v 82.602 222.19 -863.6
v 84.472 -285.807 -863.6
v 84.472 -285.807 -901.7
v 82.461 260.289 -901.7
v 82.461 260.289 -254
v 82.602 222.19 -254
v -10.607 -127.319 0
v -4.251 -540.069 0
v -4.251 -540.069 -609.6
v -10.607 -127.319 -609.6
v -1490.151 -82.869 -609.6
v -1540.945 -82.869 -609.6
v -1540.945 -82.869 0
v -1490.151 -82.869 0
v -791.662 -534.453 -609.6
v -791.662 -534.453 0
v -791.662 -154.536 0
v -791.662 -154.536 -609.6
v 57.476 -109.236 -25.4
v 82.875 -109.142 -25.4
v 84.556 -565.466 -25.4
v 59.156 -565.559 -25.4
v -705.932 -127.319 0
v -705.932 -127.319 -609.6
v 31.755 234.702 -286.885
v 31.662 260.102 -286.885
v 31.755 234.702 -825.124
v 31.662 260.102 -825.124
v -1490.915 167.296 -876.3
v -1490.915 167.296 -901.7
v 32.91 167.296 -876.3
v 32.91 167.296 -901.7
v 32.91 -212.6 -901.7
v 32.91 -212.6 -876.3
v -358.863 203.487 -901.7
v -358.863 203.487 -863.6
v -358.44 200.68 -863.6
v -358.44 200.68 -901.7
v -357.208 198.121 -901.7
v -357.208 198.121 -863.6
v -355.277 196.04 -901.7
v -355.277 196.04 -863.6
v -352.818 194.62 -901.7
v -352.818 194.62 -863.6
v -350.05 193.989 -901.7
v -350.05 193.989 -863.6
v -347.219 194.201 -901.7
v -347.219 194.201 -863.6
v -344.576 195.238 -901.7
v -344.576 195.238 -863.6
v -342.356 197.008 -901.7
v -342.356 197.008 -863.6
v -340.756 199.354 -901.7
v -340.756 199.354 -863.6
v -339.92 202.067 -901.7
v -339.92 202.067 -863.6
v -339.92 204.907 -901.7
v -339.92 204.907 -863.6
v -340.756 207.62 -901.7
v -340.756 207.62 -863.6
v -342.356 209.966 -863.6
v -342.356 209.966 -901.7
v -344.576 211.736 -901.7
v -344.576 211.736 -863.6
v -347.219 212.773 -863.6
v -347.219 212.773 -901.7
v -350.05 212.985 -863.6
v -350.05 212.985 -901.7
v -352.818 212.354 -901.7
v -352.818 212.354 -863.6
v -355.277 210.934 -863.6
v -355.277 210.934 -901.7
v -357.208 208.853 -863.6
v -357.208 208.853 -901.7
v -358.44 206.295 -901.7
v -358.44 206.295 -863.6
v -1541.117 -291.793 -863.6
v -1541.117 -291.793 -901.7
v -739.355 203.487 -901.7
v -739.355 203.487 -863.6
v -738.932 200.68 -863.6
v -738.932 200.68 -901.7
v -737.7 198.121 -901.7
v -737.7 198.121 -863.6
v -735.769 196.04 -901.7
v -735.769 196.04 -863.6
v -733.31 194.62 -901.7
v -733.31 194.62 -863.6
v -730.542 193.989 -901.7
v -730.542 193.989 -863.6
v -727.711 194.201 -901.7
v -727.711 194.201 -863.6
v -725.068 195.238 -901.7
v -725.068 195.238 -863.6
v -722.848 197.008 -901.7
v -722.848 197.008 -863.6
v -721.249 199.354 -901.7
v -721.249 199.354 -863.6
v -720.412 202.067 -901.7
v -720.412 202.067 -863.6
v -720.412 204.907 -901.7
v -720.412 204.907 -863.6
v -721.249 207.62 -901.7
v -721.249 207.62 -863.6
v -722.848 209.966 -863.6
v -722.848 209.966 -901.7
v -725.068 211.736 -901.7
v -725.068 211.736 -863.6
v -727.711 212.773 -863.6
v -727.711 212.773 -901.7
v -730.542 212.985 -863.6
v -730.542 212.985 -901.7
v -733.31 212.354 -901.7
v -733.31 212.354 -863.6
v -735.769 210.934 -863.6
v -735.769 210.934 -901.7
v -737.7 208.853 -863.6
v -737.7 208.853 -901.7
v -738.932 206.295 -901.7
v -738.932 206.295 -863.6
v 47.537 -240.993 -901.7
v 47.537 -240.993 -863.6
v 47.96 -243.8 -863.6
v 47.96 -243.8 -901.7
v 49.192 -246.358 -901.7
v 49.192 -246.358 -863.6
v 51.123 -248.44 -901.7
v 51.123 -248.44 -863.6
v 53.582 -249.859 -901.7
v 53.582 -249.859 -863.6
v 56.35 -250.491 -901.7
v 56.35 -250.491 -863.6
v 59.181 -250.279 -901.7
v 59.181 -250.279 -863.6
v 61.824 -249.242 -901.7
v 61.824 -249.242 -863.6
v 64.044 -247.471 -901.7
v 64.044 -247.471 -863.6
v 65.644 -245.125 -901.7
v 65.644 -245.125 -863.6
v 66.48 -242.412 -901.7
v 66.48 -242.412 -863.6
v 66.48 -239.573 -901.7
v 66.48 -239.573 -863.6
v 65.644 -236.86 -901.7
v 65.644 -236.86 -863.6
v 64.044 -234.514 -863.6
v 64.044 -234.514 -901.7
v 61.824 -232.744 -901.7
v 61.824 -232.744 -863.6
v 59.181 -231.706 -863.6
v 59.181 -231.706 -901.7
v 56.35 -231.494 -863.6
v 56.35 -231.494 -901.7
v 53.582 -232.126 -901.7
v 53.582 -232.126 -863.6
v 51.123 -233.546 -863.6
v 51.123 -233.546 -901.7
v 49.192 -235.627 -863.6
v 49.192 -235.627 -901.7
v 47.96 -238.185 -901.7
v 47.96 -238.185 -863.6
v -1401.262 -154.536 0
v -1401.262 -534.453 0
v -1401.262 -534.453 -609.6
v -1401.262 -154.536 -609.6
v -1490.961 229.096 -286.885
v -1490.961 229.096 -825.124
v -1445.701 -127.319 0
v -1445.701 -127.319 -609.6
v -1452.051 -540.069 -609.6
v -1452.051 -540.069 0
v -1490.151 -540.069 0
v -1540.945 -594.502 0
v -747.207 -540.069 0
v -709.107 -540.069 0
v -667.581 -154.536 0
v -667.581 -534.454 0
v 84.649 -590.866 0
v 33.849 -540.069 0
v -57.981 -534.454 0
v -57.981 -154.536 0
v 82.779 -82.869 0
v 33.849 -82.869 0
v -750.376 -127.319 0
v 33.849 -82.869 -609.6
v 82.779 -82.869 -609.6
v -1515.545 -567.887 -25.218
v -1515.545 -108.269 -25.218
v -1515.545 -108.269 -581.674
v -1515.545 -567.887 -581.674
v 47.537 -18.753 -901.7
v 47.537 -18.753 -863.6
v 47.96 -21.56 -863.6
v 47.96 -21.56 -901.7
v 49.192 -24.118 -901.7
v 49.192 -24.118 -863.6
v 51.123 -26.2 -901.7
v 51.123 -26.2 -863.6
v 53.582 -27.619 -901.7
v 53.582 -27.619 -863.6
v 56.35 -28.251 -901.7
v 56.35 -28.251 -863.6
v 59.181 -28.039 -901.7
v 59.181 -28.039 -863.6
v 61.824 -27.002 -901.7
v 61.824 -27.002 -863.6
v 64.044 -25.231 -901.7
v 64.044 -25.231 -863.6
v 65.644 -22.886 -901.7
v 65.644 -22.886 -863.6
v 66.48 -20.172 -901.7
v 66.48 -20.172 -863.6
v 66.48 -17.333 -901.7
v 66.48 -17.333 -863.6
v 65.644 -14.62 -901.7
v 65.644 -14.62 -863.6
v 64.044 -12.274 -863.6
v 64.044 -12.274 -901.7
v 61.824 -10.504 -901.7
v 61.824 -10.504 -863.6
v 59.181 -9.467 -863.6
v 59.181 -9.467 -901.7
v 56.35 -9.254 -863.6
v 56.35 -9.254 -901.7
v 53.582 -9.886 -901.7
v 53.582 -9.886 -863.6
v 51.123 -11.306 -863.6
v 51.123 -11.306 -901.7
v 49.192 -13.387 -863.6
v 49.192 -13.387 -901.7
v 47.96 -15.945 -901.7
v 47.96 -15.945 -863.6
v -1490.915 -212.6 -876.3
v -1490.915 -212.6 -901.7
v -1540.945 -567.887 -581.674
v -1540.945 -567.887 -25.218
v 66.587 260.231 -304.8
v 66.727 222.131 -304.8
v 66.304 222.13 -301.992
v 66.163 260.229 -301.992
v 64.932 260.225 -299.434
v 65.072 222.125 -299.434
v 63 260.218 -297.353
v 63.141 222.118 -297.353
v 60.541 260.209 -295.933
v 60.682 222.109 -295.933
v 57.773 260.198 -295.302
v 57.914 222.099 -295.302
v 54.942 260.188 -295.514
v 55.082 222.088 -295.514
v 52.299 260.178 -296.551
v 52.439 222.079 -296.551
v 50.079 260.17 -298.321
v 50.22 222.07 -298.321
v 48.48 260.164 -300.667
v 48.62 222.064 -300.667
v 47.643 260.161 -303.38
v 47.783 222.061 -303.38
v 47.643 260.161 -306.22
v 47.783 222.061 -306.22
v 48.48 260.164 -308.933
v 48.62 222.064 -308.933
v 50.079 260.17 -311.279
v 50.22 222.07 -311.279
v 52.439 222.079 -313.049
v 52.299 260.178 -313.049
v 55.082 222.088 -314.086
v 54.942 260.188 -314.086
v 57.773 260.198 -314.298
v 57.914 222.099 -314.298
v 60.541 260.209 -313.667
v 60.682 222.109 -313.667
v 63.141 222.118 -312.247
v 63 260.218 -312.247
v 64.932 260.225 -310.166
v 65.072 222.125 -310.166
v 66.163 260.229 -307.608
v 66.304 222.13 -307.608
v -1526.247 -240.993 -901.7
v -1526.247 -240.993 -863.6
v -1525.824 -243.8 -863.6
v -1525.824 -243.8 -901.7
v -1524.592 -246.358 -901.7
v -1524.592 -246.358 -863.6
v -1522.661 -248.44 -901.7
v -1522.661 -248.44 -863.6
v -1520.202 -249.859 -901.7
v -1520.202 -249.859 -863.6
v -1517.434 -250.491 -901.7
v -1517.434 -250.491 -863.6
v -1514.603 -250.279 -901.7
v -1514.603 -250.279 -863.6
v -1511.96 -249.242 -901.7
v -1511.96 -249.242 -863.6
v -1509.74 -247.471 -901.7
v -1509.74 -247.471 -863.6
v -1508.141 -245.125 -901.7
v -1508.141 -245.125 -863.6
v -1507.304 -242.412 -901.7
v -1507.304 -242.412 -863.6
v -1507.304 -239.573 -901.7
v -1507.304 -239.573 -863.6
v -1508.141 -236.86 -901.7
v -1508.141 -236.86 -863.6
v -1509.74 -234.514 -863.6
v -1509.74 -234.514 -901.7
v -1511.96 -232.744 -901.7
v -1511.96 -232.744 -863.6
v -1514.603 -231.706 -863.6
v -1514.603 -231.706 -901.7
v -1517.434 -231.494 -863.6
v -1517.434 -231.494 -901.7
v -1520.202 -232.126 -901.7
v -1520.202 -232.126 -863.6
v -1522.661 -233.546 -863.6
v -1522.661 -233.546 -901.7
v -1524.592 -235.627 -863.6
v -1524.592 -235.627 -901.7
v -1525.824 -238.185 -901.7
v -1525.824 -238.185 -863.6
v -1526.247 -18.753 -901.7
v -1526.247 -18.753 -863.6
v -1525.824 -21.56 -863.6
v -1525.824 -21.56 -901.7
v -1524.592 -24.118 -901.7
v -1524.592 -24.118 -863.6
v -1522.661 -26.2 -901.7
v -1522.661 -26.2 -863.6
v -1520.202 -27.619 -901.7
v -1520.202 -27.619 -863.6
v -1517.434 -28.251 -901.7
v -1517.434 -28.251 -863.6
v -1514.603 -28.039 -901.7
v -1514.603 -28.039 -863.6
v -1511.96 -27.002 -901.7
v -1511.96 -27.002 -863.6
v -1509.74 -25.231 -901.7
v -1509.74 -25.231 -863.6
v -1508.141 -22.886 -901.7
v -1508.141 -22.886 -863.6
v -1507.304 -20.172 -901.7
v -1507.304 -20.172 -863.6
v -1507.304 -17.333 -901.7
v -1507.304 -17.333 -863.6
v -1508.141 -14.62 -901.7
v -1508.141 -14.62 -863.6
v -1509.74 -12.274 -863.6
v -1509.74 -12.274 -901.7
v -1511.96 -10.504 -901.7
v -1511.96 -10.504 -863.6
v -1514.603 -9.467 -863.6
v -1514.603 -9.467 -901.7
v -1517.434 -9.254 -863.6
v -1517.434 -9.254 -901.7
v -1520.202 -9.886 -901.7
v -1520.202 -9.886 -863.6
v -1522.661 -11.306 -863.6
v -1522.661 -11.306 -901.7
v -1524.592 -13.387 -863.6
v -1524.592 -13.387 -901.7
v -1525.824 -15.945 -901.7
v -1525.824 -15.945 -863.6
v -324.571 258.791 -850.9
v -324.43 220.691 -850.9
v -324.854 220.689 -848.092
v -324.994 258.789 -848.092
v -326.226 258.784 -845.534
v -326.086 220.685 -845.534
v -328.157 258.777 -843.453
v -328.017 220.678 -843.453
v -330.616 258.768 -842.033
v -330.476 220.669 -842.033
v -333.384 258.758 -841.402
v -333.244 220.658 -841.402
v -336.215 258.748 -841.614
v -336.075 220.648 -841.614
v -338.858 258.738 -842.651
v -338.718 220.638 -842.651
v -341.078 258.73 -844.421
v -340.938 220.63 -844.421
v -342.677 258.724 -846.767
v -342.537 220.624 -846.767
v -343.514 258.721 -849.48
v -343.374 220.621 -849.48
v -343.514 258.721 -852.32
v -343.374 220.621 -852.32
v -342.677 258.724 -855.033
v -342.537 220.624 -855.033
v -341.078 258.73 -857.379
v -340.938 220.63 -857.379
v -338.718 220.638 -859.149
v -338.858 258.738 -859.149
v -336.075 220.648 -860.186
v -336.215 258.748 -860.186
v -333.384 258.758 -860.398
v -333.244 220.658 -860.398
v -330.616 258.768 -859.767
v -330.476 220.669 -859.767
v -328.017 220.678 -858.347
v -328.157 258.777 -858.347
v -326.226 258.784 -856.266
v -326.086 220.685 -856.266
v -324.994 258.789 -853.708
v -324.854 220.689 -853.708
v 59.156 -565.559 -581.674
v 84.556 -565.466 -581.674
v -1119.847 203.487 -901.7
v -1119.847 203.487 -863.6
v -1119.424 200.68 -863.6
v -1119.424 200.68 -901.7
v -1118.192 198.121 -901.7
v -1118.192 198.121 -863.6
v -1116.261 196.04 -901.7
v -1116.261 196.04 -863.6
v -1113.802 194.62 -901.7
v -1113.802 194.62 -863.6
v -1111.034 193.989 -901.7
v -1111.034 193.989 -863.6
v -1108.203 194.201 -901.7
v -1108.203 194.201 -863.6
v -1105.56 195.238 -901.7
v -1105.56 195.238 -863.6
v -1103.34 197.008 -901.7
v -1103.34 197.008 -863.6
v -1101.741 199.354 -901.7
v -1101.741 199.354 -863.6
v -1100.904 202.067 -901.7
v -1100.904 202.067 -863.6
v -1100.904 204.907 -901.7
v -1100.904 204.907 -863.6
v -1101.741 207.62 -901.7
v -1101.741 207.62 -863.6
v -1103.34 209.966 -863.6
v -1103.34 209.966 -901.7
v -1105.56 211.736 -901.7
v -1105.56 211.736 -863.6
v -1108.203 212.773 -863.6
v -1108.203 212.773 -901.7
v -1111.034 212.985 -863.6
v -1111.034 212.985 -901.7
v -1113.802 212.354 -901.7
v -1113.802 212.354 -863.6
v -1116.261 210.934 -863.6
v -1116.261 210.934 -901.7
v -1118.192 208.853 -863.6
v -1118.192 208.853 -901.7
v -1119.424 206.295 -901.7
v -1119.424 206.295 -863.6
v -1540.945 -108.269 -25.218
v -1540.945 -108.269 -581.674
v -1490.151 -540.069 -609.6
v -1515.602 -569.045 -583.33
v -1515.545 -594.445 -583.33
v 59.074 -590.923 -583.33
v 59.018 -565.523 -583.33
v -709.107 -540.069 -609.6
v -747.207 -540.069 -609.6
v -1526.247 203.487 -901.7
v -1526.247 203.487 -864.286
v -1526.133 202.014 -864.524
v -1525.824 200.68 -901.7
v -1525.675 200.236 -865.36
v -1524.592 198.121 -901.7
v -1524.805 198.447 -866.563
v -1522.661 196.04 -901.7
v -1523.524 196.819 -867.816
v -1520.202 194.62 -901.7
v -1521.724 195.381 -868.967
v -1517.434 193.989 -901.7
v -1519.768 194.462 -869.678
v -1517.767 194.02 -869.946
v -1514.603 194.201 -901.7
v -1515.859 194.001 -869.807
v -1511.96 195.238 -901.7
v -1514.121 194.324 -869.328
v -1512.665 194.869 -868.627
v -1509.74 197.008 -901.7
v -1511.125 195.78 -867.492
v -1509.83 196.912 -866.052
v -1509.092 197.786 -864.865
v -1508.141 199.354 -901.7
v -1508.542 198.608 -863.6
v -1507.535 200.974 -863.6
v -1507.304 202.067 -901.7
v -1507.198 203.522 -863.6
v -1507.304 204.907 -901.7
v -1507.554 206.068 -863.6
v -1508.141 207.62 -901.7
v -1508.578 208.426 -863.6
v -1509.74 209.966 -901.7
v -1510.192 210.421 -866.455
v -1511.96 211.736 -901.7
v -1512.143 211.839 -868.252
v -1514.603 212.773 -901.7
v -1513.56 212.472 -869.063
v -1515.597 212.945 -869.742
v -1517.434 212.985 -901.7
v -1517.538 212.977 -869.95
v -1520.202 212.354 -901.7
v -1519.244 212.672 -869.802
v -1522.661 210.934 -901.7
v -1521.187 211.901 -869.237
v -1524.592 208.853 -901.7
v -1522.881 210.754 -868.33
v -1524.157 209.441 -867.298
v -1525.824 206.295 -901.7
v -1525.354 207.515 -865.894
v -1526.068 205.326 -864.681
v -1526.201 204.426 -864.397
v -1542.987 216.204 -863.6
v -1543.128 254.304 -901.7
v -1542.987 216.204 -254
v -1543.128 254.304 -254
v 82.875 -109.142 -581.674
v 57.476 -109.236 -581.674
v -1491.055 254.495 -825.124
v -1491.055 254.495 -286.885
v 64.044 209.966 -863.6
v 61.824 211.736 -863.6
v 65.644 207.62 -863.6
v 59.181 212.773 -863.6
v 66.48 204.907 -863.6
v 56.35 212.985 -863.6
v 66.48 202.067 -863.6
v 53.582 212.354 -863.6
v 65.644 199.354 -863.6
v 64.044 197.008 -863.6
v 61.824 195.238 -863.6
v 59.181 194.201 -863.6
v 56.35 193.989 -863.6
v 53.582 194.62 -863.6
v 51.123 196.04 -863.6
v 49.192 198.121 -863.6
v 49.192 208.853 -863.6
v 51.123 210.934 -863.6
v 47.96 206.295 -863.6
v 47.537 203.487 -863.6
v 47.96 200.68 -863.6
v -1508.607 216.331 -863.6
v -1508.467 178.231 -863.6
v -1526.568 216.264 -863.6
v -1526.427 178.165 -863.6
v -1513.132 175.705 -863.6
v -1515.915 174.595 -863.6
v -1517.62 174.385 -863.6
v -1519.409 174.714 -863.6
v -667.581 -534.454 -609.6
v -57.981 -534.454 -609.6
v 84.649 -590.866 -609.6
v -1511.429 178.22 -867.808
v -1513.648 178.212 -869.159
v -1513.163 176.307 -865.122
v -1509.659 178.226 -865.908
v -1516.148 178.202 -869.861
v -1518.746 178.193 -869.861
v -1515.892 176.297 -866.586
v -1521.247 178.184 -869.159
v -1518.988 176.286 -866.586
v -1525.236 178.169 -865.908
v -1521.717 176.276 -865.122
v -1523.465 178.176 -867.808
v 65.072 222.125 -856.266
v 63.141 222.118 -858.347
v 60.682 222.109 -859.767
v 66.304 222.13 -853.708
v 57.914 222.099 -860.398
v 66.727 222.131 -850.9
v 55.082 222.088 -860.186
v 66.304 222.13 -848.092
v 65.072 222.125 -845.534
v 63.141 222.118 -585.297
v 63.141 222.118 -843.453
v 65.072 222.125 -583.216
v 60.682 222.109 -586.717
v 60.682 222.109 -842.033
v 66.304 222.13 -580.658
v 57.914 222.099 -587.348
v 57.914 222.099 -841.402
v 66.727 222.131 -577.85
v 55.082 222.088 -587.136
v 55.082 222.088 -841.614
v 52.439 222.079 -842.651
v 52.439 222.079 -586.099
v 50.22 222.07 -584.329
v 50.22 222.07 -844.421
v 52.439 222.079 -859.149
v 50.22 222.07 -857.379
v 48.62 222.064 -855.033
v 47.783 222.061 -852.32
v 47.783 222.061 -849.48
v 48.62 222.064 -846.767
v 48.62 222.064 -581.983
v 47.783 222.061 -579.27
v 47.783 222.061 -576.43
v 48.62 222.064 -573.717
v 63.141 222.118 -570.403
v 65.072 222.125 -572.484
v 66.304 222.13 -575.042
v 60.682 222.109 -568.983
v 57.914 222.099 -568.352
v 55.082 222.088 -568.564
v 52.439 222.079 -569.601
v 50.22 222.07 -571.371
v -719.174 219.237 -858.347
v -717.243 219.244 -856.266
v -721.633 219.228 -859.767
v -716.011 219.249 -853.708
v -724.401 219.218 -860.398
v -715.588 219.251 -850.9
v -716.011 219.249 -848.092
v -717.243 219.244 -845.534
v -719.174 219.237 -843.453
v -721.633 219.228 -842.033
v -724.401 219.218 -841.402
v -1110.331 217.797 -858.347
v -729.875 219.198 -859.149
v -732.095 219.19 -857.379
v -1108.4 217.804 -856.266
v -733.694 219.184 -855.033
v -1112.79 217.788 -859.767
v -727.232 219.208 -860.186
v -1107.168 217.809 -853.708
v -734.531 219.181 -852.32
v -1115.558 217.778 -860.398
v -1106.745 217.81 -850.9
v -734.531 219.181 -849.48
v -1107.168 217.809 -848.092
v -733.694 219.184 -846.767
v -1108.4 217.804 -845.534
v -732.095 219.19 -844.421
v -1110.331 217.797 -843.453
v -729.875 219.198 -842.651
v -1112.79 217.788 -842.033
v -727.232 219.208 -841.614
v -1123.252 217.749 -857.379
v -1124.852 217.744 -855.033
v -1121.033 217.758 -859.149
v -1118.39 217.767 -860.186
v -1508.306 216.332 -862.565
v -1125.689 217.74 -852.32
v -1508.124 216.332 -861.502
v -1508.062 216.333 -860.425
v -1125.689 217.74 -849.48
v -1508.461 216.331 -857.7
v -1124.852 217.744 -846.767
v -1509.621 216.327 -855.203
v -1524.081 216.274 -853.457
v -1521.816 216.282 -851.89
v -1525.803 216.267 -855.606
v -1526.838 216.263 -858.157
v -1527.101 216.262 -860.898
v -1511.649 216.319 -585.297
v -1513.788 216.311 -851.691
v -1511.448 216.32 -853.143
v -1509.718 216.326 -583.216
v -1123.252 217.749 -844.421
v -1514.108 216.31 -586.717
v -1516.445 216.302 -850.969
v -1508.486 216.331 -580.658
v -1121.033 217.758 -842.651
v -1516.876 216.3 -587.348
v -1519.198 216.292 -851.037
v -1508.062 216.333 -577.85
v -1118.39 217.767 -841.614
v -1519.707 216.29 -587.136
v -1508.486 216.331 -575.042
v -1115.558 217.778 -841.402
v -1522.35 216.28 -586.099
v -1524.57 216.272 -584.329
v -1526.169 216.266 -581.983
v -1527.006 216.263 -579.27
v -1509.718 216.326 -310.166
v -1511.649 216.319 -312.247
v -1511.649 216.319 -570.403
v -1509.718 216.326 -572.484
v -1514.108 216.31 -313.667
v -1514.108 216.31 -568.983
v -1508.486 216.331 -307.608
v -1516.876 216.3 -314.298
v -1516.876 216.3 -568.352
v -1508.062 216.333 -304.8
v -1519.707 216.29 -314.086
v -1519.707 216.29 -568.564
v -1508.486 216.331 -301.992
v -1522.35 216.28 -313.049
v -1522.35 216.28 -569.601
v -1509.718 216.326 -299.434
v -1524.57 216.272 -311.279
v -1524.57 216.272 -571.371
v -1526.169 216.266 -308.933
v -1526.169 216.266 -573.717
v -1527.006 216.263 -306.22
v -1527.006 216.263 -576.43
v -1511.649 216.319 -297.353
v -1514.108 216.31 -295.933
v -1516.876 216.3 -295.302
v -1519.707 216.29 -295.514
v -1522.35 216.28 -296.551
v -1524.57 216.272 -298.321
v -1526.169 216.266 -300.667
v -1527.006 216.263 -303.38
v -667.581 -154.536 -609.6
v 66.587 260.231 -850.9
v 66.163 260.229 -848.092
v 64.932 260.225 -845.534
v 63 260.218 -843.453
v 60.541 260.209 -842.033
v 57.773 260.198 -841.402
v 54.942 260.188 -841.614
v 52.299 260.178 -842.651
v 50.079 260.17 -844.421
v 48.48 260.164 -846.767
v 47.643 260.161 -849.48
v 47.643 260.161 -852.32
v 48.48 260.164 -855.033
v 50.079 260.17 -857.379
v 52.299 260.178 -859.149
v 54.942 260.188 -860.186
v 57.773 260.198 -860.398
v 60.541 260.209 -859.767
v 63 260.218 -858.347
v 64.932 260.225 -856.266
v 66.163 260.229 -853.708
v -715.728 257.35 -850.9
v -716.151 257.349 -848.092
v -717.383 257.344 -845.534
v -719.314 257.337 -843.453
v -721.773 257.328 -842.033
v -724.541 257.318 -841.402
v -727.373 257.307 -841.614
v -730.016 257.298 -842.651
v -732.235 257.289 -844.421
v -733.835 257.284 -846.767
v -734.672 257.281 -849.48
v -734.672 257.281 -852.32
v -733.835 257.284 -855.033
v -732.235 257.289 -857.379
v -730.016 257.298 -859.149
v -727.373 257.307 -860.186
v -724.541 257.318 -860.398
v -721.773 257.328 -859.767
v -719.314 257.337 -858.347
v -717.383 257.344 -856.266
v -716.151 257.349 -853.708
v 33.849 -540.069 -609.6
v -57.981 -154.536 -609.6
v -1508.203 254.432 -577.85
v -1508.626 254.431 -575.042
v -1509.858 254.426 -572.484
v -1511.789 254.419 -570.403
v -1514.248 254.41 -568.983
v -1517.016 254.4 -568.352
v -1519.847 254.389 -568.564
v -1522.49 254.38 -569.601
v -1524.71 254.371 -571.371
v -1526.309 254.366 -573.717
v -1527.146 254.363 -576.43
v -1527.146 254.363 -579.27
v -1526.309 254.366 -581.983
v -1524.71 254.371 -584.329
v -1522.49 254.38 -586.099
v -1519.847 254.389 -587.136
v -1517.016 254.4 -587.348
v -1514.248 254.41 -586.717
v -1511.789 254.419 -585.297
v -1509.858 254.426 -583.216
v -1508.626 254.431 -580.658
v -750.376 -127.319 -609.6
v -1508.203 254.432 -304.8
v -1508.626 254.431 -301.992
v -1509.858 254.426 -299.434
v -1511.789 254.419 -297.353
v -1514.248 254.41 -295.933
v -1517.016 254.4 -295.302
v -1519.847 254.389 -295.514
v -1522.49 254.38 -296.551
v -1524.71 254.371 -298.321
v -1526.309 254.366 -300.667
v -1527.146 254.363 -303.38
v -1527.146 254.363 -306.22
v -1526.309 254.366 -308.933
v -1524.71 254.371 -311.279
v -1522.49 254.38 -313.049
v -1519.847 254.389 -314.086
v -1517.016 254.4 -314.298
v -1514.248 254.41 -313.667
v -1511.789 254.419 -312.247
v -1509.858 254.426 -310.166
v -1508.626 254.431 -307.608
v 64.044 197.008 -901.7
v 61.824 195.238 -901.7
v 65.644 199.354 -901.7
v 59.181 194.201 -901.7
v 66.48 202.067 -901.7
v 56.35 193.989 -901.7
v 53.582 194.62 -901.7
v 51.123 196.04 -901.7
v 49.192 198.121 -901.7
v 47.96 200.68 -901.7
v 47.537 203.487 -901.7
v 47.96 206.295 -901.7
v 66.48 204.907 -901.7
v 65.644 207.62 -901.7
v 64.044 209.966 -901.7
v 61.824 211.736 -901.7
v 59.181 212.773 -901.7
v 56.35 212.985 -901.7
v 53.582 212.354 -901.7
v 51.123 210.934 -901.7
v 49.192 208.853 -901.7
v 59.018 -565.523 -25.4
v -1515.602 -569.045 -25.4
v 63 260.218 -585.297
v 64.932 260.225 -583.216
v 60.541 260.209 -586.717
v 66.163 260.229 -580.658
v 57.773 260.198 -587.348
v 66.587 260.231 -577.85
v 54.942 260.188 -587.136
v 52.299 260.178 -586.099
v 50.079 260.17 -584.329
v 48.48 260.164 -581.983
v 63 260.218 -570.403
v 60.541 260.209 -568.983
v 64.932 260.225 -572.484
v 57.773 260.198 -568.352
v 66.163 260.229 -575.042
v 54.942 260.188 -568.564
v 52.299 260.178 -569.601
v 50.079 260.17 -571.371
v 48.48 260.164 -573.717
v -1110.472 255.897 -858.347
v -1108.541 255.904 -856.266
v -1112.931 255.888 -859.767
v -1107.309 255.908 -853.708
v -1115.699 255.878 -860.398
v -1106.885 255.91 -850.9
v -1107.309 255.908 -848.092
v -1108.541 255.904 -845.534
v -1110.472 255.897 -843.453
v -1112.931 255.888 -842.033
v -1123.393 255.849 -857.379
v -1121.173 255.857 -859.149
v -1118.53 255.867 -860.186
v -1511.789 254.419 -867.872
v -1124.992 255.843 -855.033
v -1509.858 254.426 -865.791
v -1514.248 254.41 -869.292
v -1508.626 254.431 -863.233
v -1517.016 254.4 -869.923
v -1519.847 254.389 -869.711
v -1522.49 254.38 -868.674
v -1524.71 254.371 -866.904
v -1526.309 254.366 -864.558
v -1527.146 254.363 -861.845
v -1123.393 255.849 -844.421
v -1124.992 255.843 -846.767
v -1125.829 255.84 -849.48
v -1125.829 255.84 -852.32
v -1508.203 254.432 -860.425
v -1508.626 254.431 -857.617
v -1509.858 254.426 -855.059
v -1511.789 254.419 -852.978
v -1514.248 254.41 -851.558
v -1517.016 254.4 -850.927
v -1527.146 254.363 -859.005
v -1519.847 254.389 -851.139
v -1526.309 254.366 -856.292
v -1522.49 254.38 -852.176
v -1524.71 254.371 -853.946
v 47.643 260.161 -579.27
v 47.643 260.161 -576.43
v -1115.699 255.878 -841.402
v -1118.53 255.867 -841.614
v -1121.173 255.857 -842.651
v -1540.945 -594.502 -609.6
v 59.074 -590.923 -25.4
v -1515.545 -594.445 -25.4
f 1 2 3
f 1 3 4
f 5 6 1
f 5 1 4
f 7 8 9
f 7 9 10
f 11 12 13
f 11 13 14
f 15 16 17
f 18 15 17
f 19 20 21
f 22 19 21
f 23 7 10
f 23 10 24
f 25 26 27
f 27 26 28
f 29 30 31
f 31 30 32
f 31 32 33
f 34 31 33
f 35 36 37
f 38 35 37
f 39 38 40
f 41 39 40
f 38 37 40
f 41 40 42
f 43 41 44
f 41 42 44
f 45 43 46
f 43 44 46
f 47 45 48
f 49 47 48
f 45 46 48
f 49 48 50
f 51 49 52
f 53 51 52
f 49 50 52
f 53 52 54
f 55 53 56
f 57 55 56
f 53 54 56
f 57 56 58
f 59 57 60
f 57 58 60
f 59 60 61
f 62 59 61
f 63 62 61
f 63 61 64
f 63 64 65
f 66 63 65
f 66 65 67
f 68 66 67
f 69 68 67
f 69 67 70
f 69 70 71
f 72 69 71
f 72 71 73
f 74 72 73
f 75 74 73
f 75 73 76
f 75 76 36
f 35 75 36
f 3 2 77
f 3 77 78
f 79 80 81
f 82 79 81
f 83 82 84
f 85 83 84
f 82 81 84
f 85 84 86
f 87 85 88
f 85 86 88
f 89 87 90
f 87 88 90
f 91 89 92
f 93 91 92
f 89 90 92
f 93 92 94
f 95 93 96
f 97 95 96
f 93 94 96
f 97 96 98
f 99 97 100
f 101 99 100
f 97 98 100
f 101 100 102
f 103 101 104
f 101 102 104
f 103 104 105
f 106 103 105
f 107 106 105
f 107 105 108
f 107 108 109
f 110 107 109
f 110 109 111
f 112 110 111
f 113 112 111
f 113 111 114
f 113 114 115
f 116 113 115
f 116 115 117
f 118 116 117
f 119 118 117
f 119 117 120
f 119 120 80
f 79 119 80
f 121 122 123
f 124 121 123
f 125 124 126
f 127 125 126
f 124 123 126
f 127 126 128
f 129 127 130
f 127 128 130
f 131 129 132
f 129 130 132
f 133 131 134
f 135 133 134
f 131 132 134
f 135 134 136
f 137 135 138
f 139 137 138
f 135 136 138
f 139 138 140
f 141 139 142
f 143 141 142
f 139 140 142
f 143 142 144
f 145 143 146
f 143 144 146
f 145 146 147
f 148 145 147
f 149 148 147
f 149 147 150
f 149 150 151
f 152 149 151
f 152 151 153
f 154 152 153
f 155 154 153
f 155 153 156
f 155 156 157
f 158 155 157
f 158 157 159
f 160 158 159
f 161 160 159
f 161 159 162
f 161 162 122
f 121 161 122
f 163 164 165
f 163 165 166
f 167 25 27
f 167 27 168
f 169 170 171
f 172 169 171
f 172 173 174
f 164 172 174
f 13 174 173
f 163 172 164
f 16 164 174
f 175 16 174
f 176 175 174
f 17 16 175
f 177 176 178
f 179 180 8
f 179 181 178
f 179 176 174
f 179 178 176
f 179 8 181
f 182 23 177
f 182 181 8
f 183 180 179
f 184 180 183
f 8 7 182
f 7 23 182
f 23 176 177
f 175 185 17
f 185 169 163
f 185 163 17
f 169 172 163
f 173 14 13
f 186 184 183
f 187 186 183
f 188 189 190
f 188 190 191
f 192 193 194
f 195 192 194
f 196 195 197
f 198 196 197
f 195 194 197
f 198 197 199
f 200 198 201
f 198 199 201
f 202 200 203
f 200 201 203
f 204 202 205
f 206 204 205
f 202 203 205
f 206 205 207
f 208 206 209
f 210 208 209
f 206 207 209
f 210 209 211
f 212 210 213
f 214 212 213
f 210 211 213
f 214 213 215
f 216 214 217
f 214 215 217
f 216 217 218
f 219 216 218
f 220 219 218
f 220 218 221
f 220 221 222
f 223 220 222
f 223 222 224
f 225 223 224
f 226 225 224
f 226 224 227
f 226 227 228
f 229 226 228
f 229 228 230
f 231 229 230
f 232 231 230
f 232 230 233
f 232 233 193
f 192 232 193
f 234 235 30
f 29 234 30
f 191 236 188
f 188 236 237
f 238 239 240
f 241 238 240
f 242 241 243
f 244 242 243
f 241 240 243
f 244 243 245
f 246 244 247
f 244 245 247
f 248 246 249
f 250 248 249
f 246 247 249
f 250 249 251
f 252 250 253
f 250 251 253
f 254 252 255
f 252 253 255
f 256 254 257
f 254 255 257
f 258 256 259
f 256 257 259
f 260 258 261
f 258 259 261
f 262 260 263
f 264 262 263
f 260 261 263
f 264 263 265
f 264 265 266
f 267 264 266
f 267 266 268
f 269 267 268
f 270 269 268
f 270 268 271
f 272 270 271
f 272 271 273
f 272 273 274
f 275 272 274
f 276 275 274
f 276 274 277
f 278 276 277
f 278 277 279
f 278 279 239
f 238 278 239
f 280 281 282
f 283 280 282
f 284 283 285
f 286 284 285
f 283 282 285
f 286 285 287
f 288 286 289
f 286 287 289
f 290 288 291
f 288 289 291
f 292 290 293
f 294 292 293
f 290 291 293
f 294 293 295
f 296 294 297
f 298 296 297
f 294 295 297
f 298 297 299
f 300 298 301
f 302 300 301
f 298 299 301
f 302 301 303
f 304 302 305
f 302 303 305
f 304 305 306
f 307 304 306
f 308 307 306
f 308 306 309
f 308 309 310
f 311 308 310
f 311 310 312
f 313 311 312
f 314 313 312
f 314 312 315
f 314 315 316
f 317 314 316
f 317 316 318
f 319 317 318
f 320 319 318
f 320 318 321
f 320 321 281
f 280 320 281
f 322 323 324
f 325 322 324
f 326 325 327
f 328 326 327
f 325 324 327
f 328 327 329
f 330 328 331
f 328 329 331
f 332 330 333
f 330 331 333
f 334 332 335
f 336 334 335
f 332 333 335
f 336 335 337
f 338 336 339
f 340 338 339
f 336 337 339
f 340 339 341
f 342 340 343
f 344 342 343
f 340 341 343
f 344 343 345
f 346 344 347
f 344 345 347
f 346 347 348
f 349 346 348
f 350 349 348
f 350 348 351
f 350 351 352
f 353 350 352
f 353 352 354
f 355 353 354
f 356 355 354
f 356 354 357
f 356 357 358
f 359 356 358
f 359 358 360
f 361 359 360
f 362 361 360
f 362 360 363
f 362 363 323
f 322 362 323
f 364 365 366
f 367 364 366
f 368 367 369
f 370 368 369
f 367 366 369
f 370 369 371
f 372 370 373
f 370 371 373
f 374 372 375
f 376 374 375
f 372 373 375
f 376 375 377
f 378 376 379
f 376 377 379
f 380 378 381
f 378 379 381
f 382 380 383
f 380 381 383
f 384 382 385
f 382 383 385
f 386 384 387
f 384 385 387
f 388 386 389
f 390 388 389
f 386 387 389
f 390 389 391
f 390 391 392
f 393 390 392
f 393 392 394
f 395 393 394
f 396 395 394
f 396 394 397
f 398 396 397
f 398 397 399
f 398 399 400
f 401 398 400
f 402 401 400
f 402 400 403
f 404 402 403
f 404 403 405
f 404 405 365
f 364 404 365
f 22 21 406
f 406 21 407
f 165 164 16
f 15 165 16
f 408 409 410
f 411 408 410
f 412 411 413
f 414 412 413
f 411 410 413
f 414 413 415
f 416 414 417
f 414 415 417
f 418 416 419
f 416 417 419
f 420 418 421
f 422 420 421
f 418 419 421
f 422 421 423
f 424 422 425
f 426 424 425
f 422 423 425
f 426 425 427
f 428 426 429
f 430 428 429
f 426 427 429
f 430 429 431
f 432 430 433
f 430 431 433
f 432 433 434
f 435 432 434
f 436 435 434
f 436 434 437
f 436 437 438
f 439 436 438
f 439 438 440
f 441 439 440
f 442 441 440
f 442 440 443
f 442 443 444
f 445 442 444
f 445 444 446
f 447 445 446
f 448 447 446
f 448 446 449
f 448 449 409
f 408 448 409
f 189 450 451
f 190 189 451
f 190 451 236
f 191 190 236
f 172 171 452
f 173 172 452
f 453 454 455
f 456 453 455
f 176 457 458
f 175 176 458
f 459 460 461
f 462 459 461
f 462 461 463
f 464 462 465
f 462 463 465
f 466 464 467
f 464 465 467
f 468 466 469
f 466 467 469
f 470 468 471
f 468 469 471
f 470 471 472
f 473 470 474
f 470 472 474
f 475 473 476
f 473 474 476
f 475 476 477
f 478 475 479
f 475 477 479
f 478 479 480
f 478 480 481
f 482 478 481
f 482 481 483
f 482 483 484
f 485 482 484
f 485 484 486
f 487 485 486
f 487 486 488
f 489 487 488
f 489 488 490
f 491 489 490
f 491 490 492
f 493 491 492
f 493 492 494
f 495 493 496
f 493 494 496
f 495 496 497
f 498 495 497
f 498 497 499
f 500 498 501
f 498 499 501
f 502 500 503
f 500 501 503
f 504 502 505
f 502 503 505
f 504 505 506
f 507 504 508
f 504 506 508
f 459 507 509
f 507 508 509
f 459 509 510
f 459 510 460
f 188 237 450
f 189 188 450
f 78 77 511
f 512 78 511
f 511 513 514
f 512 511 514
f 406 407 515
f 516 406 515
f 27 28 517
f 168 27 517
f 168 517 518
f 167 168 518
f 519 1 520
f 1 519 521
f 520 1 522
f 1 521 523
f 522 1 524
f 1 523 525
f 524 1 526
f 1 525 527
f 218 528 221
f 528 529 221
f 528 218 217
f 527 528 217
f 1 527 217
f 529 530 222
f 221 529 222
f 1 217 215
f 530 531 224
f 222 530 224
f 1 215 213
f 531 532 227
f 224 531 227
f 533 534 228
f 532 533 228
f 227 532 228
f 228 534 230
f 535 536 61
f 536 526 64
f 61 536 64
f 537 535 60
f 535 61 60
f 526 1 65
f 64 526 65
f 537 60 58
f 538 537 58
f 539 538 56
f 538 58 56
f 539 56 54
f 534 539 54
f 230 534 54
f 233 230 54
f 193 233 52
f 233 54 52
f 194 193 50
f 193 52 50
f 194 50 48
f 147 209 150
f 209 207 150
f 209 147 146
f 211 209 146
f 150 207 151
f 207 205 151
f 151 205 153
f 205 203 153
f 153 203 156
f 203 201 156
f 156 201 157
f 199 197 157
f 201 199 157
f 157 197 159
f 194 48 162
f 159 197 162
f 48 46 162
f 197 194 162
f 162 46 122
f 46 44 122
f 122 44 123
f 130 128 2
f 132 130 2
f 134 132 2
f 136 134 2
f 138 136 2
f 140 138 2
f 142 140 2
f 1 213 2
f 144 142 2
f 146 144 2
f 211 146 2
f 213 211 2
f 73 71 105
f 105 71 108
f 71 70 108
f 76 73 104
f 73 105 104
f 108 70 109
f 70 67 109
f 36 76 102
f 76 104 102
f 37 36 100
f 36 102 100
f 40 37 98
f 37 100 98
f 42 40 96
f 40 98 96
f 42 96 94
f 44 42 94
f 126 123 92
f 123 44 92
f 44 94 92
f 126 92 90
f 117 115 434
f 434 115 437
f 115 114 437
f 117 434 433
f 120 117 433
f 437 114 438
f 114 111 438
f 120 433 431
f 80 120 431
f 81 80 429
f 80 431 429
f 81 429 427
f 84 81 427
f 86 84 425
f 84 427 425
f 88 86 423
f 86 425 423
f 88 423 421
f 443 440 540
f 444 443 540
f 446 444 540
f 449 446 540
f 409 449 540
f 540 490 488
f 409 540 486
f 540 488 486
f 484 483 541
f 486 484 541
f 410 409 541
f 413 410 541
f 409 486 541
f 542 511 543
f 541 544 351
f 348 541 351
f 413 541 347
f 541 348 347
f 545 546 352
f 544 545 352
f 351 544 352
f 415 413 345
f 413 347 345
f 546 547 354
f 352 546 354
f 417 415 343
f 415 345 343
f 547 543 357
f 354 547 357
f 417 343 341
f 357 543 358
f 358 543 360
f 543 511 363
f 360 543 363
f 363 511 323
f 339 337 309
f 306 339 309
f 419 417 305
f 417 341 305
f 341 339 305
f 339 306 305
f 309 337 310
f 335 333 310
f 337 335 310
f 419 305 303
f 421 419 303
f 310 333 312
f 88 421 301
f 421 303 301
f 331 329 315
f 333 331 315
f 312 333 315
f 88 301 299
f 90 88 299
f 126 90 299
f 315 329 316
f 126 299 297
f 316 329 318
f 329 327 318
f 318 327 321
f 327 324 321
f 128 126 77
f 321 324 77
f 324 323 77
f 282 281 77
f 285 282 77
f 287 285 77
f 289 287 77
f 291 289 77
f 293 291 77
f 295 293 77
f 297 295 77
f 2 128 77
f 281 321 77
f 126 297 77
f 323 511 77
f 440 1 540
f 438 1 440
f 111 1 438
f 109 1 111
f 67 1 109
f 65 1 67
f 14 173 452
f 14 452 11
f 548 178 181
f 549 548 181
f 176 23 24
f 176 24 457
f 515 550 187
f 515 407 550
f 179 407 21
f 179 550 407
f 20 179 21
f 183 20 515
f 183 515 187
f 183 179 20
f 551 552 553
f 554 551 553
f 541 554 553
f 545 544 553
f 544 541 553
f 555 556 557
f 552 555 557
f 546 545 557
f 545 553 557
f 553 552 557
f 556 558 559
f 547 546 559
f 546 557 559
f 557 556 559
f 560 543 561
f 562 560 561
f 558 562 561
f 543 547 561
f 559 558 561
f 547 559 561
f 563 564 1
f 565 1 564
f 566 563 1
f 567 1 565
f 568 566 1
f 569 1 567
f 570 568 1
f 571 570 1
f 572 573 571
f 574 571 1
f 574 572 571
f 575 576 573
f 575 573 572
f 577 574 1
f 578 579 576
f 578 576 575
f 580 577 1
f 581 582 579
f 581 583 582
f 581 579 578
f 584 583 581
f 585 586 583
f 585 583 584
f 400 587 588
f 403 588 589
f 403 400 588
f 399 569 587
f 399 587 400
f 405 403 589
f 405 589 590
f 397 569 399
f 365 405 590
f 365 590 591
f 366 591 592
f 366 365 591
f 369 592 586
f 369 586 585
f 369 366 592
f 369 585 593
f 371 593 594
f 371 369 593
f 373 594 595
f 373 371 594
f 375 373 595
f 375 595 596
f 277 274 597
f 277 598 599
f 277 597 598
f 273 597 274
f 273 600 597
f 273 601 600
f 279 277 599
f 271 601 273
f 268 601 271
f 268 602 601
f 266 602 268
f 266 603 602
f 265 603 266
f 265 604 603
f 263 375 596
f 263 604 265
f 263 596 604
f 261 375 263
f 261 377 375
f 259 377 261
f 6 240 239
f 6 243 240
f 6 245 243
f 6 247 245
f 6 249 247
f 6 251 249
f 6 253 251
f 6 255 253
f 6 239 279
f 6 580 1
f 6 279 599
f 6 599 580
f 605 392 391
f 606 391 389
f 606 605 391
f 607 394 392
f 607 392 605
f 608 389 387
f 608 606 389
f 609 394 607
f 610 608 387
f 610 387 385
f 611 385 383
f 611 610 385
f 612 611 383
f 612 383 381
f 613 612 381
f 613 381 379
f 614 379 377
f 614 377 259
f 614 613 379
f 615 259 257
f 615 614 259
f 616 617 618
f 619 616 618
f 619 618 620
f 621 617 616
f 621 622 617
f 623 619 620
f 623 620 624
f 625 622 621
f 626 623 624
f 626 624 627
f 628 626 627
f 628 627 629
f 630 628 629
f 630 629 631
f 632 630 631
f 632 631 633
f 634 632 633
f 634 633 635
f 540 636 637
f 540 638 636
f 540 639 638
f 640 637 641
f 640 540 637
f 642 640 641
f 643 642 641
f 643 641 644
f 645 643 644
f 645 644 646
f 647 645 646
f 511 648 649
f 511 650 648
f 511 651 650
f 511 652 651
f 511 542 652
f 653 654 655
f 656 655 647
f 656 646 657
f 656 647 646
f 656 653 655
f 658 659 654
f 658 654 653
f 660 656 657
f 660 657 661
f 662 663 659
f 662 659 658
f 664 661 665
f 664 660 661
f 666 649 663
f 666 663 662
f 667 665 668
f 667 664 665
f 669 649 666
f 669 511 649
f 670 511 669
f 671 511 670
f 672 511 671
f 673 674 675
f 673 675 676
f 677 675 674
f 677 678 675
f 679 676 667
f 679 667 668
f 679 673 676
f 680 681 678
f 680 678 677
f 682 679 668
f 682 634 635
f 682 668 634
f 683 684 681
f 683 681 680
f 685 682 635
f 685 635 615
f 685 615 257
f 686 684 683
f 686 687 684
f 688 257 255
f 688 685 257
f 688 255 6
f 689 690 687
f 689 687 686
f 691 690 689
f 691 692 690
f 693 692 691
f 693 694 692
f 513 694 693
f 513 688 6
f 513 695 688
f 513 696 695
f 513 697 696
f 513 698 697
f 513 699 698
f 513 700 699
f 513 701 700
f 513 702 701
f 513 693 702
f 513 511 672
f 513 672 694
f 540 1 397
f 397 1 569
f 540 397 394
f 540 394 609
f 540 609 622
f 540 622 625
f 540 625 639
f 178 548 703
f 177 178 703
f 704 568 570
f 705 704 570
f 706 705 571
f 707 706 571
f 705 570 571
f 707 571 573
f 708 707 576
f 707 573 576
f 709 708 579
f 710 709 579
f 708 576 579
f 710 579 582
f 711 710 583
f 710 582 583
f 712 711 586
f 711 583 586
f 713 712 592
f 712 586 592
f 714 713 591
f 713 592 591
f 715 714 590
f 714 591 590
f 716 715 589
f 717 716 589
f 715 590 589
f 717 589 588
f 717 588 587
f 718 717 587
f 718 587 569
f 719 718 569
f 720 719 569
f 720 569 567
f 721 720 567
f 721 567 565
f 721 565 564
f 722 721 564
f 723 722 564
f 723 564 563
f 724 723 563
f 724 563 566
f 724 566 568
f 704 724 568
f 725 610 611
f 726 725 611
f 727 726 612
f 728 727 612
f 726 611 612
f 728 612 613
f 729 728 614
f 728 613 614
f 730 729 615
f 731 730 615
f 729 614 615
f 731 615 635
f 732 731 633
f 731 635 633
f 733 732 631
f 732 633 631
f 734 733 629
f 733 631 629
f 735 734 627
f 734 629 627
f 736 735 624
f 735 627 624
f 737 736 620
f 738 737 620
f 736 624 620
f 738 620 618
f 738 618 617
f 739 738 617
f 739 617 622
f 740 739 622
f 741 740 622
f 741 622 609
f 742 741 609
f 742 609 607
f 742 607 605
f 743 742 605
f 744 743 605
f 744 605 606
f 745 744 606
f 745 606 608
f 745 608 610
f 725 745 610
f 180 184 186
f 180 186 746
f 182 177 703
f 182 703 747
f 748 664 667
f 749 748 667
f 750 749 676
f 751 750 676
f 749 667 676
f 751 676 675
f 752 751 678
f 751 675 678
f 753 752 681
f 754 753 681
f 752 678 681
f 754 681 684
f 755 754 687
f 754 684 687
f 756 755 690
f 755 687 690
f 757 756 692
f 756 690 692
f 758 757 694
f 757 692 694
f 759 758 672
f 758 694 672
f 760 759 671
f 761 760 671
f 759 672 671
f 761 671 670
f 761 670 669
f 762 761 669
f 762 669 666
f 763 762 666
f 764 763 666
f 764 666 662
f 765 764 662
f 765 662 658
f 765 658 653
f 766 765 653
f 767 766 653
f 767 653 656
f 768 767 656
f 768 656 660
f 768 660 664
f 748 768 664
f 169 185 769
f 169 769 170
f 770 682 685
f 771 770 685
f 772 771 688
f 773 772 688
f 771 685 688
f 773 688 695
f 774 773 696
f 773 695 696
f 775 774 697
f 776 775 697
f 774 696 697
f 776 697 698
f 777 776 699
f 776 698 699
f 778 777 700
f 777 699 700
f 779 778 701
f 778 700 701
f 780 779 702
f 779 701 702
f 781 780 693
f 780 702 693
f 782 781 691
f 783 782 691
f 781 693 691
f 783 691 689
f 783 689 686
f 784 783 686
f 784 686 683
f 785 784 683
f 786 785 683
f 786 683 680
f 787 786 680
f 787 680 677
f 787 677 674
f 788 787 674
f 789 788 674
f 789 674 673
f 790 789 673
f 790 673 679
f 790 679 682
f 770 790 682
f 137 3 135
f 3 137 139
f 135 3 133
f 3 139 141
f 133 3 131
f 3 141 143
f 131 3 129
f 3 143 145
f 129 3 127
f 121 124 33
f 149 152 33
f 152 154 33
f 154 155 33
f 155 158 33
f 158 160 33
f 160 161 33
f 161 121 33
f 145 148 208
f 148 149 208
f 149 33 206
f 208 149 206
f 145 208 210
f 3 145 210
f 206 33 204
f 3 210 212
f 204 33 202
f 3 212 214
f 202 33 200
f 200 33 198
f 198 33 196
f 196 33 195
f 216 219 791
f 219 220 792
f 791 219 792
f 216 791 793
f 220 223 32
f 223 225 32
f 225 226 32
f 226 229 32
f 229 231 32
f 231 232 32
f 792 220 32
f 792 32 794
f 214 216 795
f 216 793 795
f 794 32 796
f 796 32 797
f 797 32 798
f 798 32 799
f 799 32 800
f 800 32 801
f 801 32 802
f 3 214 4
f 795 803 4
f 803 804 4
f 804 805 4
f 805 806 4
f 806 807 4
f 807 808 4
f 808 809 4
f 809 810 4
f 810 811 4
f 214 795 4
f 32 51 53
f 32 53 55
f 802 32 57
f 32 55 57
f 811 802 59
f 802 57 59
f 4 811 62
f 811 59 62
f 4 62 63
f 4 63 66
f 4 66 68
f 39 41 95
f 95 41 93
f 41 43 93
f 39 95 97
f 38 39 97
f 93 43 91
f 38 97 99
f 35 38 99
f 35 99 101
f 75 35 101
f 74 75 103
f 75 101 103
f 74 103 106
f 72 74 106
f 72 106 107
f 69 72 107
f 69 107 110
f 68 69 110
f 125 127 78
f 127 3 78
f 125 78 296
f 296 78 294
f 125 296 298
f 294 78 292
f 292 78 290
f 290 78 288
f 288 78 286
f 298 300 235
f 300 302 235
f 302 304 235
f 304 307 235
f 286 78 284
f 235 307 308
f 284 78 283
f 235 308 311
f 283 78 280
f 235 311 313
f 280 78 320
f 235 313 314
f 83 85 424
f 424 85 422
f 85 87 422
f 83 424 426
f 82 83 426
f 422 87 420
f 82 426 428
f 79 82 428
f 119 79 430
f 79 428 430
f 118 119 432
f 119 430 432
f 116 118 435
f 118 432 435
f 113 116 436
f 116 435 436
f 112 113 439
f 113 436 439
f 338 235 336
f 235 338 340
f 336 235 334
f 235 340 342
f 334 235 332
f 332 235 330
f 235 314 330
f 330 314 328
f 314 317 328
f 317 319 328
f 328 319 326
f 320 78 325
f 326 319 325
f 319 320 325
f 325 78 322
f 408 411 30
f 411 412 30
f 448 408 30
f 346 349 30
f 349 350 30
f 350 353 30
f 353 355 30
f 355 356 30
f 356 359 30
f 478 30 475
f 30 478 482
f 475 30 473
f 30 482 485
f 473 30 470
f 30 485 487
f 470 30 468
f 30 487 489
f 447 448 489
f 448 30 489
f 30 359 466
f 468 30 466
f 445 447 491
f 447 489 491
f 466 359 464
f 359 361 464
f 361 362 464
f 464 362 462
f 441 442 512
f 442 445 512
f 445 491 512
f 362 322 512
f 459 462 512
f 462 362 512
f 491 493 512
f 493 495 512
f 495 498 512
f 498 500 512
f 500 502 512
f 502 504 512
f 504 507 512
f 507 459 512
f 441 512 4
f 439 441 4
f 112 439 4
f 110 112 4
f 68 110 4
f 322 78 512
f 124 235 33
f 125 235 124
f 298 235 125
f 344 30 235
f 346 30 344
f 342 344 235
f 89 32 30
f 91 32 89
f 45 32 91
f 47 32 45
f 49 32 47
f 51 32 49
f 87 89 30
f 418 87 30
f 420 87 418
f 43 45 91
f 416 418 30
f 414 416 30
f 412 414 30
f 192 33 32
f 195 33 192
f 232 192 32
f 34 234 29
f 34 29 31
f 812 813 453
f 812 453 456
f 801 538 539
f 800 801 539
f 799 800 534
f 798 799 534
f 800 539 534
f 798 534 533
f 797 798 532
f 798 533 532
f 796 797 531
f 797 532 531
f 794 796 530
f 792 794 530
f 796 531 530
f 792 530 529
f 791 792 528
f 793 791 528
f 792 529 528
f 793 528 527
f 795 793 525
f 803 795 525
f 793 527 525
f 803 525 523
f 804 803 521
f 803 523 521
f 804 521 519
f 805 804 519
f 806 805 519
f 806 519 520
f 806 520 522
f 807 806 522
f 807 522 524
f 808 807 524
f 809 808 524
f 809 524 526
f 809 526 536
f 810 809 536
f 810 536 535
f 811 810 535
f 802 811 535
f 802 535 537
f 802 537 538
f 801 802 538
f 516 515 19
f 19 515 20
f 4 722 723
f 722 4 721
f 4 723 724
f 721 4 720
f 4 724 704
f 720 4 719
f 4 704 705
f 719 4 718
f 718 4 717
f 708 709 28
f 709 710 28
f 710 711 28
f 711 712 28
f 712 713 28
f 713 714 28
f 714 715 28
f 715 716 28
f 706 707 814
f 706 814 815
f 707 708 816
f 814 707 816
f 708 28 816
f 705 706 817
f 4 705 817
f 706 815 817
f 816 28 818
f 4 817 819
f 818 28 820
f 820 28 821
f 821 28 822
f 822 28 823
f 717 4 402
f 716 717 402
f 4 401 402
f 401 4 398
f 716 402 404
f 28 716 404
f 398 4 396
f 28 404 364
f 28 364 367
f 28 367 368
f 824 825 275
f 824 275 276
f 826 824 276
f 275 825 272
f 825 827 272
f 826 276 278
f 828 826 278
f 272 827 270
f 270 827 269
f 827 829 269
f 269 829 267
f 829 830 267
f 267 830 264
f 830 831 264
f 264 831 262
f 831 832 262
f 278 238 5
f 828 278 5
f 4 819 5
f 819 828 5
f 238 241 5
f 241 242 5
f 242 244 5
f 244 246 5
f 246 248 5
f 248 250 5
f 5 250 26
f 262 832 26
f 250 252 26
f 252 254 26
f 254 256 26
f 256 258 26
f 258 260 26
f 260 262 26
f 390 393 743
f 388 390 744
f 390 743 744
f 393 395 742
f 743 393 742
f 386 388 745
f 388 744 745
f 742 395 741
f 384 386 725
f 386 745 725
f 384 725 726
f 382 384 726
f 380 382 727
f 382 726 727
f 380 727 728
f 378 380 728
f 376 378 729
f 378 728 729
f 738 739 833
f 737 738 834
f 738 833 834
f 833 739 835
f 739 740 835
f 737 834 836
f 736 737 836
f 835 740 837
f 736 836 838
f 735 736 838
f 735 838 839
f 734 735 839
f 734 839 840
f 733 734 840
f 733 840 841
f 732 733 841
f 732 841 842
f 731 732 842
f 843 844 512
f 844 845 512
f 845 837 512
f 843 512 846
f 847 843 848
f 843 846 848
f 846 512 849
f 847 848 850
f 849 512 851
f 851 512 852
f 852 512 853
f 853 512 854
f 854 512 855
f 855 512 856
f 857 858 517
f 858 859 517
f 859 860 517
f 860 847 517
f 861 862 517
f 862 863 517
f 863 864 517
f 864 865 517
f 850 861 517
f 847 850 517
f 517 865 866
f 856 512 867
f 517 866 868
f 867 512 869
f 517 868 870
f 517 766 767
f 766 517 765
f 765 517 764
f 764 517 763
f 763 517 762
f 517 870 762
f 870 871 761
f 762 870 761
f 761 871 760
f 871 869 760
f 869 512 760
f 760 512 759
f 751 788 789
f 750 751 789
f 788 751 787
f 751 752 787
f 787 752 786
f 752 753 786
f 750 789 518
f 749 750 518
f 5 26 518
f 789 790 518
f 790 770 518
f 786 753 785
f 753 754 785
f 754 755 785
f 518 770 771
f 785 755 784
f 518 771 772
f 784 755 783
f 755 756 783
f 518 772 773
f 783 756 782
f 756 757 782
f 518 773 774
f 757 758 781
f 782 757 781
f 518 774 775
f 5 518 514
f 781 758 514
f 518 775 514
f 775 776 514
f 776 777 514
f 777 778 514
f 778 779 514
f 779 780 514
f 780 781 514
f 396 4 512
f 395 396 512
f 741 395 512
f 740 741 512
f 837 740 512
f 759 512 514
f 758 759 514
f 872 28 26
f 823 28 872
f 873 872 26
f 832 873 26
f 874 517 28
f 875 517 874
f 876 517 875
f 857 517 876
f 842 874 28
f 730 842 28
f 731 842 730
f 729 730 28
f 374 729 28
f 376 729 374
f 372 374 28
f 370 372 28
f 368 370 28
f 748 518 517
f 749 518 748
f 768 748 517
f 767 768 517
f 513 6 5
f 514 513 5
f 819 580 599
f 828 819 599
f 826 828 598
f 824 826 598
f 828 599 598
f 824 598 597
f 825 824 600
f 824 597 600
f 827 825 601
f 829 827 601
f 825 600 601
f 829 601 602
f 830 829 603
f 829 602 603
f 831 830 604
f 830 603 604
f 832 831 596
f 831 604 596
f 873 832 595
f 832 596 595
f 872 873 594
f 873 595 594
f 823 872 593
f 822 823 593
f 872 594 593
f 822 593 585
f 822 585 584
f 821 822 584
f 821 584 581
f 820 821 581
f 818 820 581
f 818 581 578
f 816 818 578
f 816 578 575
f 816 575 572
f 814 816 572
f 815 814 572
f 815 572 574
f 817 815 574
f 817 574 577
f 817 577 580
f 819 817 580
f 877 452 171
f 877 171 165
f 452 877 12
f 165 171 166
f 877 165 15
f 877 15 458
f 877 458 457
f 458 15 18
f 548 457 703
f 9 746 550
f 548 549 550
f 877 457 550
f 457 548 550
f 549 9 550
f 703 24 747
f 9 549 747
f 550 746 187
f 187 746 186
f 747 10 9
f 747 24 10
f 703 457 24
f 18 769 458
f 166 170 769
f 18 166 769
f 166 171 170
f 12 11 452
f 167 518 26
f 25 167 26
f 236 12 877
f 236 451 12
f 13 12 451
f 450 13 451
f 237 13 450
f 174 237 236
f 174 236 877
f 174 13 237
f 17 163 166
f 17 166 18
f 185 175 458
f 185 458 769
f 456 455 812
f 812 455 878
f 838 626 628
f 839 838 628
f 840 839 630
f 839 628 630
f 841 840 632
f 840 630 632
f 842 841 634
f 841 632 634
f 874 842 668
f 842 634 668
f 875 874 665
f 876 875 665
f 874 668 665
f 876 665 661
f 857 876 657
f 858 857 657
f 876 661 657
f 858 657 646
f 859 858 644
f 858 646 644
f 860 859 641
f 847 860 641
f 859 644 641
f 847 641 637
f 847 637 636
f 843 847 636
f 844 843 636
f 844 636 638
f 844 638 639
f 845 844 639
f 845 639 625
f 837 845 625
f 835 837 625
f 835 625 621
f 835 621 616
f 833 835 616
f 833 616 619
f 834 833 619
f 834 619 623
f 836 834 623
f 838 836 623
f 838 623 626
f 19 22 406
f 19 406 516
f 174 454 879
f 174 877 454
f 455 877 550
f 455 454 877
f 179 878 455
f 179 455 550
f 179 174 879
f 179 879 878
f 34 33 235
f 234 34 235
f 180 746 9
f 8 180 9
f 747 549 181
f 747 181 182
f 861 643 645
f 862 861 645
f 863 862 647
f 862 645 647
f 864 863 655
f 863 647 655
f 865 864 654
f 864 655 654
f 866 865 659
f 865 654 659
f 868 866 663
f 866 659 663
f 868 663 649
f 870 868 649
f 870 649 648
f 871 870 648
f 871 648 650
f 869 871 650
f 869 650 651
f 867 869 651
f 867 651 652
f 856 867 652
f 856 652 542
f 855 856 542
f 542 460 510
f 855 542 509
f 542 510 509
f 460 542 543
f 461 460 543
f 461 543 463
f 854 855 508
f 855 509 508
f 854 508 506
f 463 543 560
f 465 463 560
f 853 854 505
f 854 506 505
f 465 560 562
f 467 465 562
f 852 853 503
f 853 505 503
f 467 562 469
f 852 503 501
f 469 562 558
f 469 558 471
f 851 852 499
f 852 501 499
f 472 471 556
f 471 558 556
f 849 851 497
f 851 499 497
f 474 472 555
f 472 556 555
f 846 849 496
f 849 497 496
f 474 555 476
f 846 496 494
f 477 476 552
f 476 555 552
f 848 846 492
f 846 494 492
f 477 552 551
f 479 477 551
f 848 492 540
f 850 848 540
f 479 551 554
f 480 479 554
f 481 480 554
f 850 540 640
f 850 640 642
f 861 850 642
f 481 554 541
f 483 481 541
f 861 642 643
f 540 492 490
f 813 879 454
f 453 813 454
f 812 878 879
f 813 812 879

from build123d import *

# Parameters (mm, degrees)
F1_DEPTH  = 609.6
F2_W      = 609.6
F2_H      = 379.9170106649
F3_DEPTH  = 609.6
F4_W      = 609.6
F4_H      = 379.91796
F5_DEPTH  = 609.6
F7_DEPTH  = 609.6
F8_W      = 38.1
F8_H      = 609.6
F9_DEPTH  = 1625.6
F12_DEPTH = 25.4
F14_DEPTH = 25.4
F16_DEPTH = 25.4
F18_D     = 19.05
F18_DEPTH = 76.2
F18_TIP   = 5.7231973962
F20_D     = 19.05
F20_DEPTH = 76.2
F20_TIP   = 5.7231973962
F22_DEPTH = 25.4
F24_D     = 19.05
F24_DEPTH = 76.2
F24_TIP   = 5.7231973962
F26_DEPTH = 25.4


with BuildPart() as f1:
    # F0 (on Top) → F1 (new body)
    with BuildSketch(Plane.XY):
        Polygon((84.6492510451, -590.8656727771), (82.5916901231, -32.0694608688), (-1540.9447381875, -35.7017337799), (-1540.9447381875, -594.5017337799), align=None)
        Polygon((-1490.1507489549, -540.0694608688), (-1490.1507489549, -82.8694608688), (33.8492510451, -82.8694608688), (33.8492510451, -540.0694608688), (-4.2507489549, -540.0694608688), (-10.6066635132, -127.3194608688), (-705.9316635132, -127.3194608688), (-709.1066635132, -540.0694608688), (-747.2066635132, -540.0694608688), (-750.3757489549, -127.3194608688), (-1445.7007489549, -127.3194608688), (-1452.0507489549, -540.0694608688), align=None, mode=Mode.SUBTRACT)
    extrude(amount=-F1_DEPTH)

    # F2 (on face) → F3 (cut)
    with BuildSketch(Plane.XY):
        with Locations((-1096.4615680695, -344.4945290685)):
            Rectangle(F2_W, F2_H)
    extrude(amount=-F3_DEPTH, mode=Mode.SUBTRACT)

    # F4 (on face) → F5 (cut)
    with BuildSketch(Plane.XY):
        with Locations((-362.7812602043, -344.495003736)):
            Rectangle(F4_W, F4_H)
    extrude(amount=-F5_DEPTH, mode=Mode.SUBTRACT)

    # F6 (on face) → F7 (cut)
    with BuildSketch(Plane.XY):
        Polygon((-1540.9447381875, -35.7017337799), (-1540.9447381875, -82.8694608688), (82.778742384, -82.8694608688), (82.5916901231, -32.0694608688), align=None)
    extrude(amount=-F7_DEPTH, mode=Mode.SUBTRACT)

    # F11 (on face) → F12 (cut)
    with BuildSketch(Plane(origin=(1.3220406475, -591.0520556145, 0), x_dir=(0.9999974985, 0.0022367528, 0), z_dir=(0.0022367528, -0.9999974985, 0))):
        Polygon((-1465.8825397491, -25.4), (-1516.8706368785, -25.4), (-1516.8706368785, -290.197044611), (-1516.8706368785, -583.3304524422), (57.752572, -583.3304524422), (57.752572, -25.4), align=None)
    extrude(amount=-F12_DEPTH, mode=Mode.SUBTRACT)

    # F13 (on face) → F14 (cut)
    with BuildSketch(Plane(origin=(82.4724879938, 0.3036745146, 0), x_dir=(-0.0036821062, 0.999993221, 0), z_dir=(0.999993221, 0.0036821062, 0))):
        Polygon((-337.1735270288, -25.4), (-565.7733548417, -25.4), (-565.7733548417, -58.3401173353), (-565.7733548417, -581.6743373871), (-109.4463914633, -581.6743373871), (-109.4463914633, -25.4), align=None)
    extrude(amount=-F14_DEPTH, mode=Mode.SUBTRACT)

    # F15 (on face) → F16 (cut)
    with BuildSketch(Plane(origin=(-1540.9447381875, 0, 0), x_dir=(0, -1, 0), z_dir=(-1, 0, 0))):
        Polygon((338.6855973244, -25.2176970243), (108.2694608688, -25.2176970243), (108.2694608688, -290.197044611), (108.2694608688, -581.6743373871), (567.8874850273, -581.6743373871), (567.8874850273, -25.2176970243), align=None)
    extrude(amount=-F16_DEPTH, mode=Mode.SUBTRACT)


with BuildPart() as f9:
    # F8 (on face) → F9 (new body)
    with BuildSketch(Plane(origin=(82.4724879938, 0.3036745146, 0), x_dir=(-0.0036821062, 0.999993221, 0), z_dir=(0.999993221, 0.0036821062, 0))):
        with Locations((-19.05, -304.8)):
            Rectangle(F8_W, F8_H)
        Polygon((0, -609.6), (-38.1, -609.6), (-83.173699216, -609.6), (-546.1, -609.6), (-546.1, -647.7), (0, -647.7), align=None)
    extrude(amount=F9_DEPTH)


with BuildPart() as f9_1:
    # F10: moved
    add(f9.part.moved(Location((-1625.6, 254, -254))))

    # F18
    with Locations(Plane(origin=(-0.9572883561, 259.9821474887, 0), x_dir=(-0.999993221, -0.0036821062, 0), z_dir=(-0.0036821062, 0.999993221, 0))):
        with Locations((-58.0193219443, -304.8), (-58.0193219443, -577.85), (-58.0193219443, -850.9)):
            Hole(F18_D / 2, depth=F18_DEPTH)
            with Locations((0, 0, -(F18_DEPTH + F18_TIP / 2))):  # 118° drill point
                Cone(0, F18_D / 2, F18_TIP, mode=Mode.SUBTRACT)

    # F20
    with Locations(Plane(origin=(-0.9572883561, 259.9821474887, 0), x_dir=(-0.999993221, -0.0036821062, 0), z_dir=(-0.0036821062, 0.999993221, 0))):
        with Locations((333.1406780557, -850.9), (724.3006780557, -850.9), (1115.4606780557, -850.9), (1516.7806780557, -860.425), (1516.7806780557, -577.85), (1516.7806780557, -304.8)):
            Hole(F20_D / 2, depth=F20_DEPTH)
            with Locations((0, 0, -(F20_DEPTH + F20_TIP / 2))):  # 118° drill point
                Cone(0, F20_D / 2, F20_TIP, mode=Mode.SUBTRACT)

    # F21 (on face) → F22 (cut)
    with BuildSketch(Plane(origin=(-0.9572883561, 259.9821474887, 0), x_dir=(-0.999993221, -0.0036821062, 0), z_dir=(-0.0036821062, 0.999993221, 0))):
        Polygon((-32.6193219443, -286.8848145008), (-32.6193219443, -374.6592402458), (-32.6193219443, -825.1241445541), (1490.1075363159, -825.1241445541), (1490.1075363159, -286.8848145008), align=None)
    extrude(amount=-F22_DEPTH, mode=Mode.SUBTRACT)

    # F24
    with Locations(Plane(origin=(0, 0, -901.7), x_dir=(1, 0, 0), z_dir=(0, 0, -1))):
        with Locations((-1516.7224572913, 240.9926234866), (-1516.7224572913, 18.752777536), (-1516.7224572913, -203.4870684147), (-1110.3224572913, -203.4870684147), (-349.3381875374, -203.4870684147), (-729.8303224143, -203.4870684147), (57.0618124626, -203.4870684147), (57.0618124626, 18.752777536), (57.0618124626, 240.9926234866)):
            Hole(F24_D / 2, depth=F24_DEPTH)
            with Locations((0, 0, -(F24_DEPTH + F24_TIP / 2))):  # 118° drill point
                Cone(0, F24_D / 2, F24_TIP, mode=Mode.SUBTRACT)

    # F25 (on face) → F26 (cut)
    with BuildSketch(Plane(origin=(0, 0, -901.7), x_dir=(1, 0, 0), z_dir=(0, 0, -1))):
        Polygon((-1490.9147545666, 212.5998076), (-1490.9147545666, 129.2820857336), (-1490.9147545666, -167.2963202), (32.9103753676, -167.2963202), (32.9103753676, 78.9847744763), (32.9103753676, 212.5998076), (-728.322223784, 212.5998076), align=None)
    extrude(amount=-F26_DEPTH, mode=Mode.SUBTRACT)


solid = Compound([f1.part, f9_1.part])
